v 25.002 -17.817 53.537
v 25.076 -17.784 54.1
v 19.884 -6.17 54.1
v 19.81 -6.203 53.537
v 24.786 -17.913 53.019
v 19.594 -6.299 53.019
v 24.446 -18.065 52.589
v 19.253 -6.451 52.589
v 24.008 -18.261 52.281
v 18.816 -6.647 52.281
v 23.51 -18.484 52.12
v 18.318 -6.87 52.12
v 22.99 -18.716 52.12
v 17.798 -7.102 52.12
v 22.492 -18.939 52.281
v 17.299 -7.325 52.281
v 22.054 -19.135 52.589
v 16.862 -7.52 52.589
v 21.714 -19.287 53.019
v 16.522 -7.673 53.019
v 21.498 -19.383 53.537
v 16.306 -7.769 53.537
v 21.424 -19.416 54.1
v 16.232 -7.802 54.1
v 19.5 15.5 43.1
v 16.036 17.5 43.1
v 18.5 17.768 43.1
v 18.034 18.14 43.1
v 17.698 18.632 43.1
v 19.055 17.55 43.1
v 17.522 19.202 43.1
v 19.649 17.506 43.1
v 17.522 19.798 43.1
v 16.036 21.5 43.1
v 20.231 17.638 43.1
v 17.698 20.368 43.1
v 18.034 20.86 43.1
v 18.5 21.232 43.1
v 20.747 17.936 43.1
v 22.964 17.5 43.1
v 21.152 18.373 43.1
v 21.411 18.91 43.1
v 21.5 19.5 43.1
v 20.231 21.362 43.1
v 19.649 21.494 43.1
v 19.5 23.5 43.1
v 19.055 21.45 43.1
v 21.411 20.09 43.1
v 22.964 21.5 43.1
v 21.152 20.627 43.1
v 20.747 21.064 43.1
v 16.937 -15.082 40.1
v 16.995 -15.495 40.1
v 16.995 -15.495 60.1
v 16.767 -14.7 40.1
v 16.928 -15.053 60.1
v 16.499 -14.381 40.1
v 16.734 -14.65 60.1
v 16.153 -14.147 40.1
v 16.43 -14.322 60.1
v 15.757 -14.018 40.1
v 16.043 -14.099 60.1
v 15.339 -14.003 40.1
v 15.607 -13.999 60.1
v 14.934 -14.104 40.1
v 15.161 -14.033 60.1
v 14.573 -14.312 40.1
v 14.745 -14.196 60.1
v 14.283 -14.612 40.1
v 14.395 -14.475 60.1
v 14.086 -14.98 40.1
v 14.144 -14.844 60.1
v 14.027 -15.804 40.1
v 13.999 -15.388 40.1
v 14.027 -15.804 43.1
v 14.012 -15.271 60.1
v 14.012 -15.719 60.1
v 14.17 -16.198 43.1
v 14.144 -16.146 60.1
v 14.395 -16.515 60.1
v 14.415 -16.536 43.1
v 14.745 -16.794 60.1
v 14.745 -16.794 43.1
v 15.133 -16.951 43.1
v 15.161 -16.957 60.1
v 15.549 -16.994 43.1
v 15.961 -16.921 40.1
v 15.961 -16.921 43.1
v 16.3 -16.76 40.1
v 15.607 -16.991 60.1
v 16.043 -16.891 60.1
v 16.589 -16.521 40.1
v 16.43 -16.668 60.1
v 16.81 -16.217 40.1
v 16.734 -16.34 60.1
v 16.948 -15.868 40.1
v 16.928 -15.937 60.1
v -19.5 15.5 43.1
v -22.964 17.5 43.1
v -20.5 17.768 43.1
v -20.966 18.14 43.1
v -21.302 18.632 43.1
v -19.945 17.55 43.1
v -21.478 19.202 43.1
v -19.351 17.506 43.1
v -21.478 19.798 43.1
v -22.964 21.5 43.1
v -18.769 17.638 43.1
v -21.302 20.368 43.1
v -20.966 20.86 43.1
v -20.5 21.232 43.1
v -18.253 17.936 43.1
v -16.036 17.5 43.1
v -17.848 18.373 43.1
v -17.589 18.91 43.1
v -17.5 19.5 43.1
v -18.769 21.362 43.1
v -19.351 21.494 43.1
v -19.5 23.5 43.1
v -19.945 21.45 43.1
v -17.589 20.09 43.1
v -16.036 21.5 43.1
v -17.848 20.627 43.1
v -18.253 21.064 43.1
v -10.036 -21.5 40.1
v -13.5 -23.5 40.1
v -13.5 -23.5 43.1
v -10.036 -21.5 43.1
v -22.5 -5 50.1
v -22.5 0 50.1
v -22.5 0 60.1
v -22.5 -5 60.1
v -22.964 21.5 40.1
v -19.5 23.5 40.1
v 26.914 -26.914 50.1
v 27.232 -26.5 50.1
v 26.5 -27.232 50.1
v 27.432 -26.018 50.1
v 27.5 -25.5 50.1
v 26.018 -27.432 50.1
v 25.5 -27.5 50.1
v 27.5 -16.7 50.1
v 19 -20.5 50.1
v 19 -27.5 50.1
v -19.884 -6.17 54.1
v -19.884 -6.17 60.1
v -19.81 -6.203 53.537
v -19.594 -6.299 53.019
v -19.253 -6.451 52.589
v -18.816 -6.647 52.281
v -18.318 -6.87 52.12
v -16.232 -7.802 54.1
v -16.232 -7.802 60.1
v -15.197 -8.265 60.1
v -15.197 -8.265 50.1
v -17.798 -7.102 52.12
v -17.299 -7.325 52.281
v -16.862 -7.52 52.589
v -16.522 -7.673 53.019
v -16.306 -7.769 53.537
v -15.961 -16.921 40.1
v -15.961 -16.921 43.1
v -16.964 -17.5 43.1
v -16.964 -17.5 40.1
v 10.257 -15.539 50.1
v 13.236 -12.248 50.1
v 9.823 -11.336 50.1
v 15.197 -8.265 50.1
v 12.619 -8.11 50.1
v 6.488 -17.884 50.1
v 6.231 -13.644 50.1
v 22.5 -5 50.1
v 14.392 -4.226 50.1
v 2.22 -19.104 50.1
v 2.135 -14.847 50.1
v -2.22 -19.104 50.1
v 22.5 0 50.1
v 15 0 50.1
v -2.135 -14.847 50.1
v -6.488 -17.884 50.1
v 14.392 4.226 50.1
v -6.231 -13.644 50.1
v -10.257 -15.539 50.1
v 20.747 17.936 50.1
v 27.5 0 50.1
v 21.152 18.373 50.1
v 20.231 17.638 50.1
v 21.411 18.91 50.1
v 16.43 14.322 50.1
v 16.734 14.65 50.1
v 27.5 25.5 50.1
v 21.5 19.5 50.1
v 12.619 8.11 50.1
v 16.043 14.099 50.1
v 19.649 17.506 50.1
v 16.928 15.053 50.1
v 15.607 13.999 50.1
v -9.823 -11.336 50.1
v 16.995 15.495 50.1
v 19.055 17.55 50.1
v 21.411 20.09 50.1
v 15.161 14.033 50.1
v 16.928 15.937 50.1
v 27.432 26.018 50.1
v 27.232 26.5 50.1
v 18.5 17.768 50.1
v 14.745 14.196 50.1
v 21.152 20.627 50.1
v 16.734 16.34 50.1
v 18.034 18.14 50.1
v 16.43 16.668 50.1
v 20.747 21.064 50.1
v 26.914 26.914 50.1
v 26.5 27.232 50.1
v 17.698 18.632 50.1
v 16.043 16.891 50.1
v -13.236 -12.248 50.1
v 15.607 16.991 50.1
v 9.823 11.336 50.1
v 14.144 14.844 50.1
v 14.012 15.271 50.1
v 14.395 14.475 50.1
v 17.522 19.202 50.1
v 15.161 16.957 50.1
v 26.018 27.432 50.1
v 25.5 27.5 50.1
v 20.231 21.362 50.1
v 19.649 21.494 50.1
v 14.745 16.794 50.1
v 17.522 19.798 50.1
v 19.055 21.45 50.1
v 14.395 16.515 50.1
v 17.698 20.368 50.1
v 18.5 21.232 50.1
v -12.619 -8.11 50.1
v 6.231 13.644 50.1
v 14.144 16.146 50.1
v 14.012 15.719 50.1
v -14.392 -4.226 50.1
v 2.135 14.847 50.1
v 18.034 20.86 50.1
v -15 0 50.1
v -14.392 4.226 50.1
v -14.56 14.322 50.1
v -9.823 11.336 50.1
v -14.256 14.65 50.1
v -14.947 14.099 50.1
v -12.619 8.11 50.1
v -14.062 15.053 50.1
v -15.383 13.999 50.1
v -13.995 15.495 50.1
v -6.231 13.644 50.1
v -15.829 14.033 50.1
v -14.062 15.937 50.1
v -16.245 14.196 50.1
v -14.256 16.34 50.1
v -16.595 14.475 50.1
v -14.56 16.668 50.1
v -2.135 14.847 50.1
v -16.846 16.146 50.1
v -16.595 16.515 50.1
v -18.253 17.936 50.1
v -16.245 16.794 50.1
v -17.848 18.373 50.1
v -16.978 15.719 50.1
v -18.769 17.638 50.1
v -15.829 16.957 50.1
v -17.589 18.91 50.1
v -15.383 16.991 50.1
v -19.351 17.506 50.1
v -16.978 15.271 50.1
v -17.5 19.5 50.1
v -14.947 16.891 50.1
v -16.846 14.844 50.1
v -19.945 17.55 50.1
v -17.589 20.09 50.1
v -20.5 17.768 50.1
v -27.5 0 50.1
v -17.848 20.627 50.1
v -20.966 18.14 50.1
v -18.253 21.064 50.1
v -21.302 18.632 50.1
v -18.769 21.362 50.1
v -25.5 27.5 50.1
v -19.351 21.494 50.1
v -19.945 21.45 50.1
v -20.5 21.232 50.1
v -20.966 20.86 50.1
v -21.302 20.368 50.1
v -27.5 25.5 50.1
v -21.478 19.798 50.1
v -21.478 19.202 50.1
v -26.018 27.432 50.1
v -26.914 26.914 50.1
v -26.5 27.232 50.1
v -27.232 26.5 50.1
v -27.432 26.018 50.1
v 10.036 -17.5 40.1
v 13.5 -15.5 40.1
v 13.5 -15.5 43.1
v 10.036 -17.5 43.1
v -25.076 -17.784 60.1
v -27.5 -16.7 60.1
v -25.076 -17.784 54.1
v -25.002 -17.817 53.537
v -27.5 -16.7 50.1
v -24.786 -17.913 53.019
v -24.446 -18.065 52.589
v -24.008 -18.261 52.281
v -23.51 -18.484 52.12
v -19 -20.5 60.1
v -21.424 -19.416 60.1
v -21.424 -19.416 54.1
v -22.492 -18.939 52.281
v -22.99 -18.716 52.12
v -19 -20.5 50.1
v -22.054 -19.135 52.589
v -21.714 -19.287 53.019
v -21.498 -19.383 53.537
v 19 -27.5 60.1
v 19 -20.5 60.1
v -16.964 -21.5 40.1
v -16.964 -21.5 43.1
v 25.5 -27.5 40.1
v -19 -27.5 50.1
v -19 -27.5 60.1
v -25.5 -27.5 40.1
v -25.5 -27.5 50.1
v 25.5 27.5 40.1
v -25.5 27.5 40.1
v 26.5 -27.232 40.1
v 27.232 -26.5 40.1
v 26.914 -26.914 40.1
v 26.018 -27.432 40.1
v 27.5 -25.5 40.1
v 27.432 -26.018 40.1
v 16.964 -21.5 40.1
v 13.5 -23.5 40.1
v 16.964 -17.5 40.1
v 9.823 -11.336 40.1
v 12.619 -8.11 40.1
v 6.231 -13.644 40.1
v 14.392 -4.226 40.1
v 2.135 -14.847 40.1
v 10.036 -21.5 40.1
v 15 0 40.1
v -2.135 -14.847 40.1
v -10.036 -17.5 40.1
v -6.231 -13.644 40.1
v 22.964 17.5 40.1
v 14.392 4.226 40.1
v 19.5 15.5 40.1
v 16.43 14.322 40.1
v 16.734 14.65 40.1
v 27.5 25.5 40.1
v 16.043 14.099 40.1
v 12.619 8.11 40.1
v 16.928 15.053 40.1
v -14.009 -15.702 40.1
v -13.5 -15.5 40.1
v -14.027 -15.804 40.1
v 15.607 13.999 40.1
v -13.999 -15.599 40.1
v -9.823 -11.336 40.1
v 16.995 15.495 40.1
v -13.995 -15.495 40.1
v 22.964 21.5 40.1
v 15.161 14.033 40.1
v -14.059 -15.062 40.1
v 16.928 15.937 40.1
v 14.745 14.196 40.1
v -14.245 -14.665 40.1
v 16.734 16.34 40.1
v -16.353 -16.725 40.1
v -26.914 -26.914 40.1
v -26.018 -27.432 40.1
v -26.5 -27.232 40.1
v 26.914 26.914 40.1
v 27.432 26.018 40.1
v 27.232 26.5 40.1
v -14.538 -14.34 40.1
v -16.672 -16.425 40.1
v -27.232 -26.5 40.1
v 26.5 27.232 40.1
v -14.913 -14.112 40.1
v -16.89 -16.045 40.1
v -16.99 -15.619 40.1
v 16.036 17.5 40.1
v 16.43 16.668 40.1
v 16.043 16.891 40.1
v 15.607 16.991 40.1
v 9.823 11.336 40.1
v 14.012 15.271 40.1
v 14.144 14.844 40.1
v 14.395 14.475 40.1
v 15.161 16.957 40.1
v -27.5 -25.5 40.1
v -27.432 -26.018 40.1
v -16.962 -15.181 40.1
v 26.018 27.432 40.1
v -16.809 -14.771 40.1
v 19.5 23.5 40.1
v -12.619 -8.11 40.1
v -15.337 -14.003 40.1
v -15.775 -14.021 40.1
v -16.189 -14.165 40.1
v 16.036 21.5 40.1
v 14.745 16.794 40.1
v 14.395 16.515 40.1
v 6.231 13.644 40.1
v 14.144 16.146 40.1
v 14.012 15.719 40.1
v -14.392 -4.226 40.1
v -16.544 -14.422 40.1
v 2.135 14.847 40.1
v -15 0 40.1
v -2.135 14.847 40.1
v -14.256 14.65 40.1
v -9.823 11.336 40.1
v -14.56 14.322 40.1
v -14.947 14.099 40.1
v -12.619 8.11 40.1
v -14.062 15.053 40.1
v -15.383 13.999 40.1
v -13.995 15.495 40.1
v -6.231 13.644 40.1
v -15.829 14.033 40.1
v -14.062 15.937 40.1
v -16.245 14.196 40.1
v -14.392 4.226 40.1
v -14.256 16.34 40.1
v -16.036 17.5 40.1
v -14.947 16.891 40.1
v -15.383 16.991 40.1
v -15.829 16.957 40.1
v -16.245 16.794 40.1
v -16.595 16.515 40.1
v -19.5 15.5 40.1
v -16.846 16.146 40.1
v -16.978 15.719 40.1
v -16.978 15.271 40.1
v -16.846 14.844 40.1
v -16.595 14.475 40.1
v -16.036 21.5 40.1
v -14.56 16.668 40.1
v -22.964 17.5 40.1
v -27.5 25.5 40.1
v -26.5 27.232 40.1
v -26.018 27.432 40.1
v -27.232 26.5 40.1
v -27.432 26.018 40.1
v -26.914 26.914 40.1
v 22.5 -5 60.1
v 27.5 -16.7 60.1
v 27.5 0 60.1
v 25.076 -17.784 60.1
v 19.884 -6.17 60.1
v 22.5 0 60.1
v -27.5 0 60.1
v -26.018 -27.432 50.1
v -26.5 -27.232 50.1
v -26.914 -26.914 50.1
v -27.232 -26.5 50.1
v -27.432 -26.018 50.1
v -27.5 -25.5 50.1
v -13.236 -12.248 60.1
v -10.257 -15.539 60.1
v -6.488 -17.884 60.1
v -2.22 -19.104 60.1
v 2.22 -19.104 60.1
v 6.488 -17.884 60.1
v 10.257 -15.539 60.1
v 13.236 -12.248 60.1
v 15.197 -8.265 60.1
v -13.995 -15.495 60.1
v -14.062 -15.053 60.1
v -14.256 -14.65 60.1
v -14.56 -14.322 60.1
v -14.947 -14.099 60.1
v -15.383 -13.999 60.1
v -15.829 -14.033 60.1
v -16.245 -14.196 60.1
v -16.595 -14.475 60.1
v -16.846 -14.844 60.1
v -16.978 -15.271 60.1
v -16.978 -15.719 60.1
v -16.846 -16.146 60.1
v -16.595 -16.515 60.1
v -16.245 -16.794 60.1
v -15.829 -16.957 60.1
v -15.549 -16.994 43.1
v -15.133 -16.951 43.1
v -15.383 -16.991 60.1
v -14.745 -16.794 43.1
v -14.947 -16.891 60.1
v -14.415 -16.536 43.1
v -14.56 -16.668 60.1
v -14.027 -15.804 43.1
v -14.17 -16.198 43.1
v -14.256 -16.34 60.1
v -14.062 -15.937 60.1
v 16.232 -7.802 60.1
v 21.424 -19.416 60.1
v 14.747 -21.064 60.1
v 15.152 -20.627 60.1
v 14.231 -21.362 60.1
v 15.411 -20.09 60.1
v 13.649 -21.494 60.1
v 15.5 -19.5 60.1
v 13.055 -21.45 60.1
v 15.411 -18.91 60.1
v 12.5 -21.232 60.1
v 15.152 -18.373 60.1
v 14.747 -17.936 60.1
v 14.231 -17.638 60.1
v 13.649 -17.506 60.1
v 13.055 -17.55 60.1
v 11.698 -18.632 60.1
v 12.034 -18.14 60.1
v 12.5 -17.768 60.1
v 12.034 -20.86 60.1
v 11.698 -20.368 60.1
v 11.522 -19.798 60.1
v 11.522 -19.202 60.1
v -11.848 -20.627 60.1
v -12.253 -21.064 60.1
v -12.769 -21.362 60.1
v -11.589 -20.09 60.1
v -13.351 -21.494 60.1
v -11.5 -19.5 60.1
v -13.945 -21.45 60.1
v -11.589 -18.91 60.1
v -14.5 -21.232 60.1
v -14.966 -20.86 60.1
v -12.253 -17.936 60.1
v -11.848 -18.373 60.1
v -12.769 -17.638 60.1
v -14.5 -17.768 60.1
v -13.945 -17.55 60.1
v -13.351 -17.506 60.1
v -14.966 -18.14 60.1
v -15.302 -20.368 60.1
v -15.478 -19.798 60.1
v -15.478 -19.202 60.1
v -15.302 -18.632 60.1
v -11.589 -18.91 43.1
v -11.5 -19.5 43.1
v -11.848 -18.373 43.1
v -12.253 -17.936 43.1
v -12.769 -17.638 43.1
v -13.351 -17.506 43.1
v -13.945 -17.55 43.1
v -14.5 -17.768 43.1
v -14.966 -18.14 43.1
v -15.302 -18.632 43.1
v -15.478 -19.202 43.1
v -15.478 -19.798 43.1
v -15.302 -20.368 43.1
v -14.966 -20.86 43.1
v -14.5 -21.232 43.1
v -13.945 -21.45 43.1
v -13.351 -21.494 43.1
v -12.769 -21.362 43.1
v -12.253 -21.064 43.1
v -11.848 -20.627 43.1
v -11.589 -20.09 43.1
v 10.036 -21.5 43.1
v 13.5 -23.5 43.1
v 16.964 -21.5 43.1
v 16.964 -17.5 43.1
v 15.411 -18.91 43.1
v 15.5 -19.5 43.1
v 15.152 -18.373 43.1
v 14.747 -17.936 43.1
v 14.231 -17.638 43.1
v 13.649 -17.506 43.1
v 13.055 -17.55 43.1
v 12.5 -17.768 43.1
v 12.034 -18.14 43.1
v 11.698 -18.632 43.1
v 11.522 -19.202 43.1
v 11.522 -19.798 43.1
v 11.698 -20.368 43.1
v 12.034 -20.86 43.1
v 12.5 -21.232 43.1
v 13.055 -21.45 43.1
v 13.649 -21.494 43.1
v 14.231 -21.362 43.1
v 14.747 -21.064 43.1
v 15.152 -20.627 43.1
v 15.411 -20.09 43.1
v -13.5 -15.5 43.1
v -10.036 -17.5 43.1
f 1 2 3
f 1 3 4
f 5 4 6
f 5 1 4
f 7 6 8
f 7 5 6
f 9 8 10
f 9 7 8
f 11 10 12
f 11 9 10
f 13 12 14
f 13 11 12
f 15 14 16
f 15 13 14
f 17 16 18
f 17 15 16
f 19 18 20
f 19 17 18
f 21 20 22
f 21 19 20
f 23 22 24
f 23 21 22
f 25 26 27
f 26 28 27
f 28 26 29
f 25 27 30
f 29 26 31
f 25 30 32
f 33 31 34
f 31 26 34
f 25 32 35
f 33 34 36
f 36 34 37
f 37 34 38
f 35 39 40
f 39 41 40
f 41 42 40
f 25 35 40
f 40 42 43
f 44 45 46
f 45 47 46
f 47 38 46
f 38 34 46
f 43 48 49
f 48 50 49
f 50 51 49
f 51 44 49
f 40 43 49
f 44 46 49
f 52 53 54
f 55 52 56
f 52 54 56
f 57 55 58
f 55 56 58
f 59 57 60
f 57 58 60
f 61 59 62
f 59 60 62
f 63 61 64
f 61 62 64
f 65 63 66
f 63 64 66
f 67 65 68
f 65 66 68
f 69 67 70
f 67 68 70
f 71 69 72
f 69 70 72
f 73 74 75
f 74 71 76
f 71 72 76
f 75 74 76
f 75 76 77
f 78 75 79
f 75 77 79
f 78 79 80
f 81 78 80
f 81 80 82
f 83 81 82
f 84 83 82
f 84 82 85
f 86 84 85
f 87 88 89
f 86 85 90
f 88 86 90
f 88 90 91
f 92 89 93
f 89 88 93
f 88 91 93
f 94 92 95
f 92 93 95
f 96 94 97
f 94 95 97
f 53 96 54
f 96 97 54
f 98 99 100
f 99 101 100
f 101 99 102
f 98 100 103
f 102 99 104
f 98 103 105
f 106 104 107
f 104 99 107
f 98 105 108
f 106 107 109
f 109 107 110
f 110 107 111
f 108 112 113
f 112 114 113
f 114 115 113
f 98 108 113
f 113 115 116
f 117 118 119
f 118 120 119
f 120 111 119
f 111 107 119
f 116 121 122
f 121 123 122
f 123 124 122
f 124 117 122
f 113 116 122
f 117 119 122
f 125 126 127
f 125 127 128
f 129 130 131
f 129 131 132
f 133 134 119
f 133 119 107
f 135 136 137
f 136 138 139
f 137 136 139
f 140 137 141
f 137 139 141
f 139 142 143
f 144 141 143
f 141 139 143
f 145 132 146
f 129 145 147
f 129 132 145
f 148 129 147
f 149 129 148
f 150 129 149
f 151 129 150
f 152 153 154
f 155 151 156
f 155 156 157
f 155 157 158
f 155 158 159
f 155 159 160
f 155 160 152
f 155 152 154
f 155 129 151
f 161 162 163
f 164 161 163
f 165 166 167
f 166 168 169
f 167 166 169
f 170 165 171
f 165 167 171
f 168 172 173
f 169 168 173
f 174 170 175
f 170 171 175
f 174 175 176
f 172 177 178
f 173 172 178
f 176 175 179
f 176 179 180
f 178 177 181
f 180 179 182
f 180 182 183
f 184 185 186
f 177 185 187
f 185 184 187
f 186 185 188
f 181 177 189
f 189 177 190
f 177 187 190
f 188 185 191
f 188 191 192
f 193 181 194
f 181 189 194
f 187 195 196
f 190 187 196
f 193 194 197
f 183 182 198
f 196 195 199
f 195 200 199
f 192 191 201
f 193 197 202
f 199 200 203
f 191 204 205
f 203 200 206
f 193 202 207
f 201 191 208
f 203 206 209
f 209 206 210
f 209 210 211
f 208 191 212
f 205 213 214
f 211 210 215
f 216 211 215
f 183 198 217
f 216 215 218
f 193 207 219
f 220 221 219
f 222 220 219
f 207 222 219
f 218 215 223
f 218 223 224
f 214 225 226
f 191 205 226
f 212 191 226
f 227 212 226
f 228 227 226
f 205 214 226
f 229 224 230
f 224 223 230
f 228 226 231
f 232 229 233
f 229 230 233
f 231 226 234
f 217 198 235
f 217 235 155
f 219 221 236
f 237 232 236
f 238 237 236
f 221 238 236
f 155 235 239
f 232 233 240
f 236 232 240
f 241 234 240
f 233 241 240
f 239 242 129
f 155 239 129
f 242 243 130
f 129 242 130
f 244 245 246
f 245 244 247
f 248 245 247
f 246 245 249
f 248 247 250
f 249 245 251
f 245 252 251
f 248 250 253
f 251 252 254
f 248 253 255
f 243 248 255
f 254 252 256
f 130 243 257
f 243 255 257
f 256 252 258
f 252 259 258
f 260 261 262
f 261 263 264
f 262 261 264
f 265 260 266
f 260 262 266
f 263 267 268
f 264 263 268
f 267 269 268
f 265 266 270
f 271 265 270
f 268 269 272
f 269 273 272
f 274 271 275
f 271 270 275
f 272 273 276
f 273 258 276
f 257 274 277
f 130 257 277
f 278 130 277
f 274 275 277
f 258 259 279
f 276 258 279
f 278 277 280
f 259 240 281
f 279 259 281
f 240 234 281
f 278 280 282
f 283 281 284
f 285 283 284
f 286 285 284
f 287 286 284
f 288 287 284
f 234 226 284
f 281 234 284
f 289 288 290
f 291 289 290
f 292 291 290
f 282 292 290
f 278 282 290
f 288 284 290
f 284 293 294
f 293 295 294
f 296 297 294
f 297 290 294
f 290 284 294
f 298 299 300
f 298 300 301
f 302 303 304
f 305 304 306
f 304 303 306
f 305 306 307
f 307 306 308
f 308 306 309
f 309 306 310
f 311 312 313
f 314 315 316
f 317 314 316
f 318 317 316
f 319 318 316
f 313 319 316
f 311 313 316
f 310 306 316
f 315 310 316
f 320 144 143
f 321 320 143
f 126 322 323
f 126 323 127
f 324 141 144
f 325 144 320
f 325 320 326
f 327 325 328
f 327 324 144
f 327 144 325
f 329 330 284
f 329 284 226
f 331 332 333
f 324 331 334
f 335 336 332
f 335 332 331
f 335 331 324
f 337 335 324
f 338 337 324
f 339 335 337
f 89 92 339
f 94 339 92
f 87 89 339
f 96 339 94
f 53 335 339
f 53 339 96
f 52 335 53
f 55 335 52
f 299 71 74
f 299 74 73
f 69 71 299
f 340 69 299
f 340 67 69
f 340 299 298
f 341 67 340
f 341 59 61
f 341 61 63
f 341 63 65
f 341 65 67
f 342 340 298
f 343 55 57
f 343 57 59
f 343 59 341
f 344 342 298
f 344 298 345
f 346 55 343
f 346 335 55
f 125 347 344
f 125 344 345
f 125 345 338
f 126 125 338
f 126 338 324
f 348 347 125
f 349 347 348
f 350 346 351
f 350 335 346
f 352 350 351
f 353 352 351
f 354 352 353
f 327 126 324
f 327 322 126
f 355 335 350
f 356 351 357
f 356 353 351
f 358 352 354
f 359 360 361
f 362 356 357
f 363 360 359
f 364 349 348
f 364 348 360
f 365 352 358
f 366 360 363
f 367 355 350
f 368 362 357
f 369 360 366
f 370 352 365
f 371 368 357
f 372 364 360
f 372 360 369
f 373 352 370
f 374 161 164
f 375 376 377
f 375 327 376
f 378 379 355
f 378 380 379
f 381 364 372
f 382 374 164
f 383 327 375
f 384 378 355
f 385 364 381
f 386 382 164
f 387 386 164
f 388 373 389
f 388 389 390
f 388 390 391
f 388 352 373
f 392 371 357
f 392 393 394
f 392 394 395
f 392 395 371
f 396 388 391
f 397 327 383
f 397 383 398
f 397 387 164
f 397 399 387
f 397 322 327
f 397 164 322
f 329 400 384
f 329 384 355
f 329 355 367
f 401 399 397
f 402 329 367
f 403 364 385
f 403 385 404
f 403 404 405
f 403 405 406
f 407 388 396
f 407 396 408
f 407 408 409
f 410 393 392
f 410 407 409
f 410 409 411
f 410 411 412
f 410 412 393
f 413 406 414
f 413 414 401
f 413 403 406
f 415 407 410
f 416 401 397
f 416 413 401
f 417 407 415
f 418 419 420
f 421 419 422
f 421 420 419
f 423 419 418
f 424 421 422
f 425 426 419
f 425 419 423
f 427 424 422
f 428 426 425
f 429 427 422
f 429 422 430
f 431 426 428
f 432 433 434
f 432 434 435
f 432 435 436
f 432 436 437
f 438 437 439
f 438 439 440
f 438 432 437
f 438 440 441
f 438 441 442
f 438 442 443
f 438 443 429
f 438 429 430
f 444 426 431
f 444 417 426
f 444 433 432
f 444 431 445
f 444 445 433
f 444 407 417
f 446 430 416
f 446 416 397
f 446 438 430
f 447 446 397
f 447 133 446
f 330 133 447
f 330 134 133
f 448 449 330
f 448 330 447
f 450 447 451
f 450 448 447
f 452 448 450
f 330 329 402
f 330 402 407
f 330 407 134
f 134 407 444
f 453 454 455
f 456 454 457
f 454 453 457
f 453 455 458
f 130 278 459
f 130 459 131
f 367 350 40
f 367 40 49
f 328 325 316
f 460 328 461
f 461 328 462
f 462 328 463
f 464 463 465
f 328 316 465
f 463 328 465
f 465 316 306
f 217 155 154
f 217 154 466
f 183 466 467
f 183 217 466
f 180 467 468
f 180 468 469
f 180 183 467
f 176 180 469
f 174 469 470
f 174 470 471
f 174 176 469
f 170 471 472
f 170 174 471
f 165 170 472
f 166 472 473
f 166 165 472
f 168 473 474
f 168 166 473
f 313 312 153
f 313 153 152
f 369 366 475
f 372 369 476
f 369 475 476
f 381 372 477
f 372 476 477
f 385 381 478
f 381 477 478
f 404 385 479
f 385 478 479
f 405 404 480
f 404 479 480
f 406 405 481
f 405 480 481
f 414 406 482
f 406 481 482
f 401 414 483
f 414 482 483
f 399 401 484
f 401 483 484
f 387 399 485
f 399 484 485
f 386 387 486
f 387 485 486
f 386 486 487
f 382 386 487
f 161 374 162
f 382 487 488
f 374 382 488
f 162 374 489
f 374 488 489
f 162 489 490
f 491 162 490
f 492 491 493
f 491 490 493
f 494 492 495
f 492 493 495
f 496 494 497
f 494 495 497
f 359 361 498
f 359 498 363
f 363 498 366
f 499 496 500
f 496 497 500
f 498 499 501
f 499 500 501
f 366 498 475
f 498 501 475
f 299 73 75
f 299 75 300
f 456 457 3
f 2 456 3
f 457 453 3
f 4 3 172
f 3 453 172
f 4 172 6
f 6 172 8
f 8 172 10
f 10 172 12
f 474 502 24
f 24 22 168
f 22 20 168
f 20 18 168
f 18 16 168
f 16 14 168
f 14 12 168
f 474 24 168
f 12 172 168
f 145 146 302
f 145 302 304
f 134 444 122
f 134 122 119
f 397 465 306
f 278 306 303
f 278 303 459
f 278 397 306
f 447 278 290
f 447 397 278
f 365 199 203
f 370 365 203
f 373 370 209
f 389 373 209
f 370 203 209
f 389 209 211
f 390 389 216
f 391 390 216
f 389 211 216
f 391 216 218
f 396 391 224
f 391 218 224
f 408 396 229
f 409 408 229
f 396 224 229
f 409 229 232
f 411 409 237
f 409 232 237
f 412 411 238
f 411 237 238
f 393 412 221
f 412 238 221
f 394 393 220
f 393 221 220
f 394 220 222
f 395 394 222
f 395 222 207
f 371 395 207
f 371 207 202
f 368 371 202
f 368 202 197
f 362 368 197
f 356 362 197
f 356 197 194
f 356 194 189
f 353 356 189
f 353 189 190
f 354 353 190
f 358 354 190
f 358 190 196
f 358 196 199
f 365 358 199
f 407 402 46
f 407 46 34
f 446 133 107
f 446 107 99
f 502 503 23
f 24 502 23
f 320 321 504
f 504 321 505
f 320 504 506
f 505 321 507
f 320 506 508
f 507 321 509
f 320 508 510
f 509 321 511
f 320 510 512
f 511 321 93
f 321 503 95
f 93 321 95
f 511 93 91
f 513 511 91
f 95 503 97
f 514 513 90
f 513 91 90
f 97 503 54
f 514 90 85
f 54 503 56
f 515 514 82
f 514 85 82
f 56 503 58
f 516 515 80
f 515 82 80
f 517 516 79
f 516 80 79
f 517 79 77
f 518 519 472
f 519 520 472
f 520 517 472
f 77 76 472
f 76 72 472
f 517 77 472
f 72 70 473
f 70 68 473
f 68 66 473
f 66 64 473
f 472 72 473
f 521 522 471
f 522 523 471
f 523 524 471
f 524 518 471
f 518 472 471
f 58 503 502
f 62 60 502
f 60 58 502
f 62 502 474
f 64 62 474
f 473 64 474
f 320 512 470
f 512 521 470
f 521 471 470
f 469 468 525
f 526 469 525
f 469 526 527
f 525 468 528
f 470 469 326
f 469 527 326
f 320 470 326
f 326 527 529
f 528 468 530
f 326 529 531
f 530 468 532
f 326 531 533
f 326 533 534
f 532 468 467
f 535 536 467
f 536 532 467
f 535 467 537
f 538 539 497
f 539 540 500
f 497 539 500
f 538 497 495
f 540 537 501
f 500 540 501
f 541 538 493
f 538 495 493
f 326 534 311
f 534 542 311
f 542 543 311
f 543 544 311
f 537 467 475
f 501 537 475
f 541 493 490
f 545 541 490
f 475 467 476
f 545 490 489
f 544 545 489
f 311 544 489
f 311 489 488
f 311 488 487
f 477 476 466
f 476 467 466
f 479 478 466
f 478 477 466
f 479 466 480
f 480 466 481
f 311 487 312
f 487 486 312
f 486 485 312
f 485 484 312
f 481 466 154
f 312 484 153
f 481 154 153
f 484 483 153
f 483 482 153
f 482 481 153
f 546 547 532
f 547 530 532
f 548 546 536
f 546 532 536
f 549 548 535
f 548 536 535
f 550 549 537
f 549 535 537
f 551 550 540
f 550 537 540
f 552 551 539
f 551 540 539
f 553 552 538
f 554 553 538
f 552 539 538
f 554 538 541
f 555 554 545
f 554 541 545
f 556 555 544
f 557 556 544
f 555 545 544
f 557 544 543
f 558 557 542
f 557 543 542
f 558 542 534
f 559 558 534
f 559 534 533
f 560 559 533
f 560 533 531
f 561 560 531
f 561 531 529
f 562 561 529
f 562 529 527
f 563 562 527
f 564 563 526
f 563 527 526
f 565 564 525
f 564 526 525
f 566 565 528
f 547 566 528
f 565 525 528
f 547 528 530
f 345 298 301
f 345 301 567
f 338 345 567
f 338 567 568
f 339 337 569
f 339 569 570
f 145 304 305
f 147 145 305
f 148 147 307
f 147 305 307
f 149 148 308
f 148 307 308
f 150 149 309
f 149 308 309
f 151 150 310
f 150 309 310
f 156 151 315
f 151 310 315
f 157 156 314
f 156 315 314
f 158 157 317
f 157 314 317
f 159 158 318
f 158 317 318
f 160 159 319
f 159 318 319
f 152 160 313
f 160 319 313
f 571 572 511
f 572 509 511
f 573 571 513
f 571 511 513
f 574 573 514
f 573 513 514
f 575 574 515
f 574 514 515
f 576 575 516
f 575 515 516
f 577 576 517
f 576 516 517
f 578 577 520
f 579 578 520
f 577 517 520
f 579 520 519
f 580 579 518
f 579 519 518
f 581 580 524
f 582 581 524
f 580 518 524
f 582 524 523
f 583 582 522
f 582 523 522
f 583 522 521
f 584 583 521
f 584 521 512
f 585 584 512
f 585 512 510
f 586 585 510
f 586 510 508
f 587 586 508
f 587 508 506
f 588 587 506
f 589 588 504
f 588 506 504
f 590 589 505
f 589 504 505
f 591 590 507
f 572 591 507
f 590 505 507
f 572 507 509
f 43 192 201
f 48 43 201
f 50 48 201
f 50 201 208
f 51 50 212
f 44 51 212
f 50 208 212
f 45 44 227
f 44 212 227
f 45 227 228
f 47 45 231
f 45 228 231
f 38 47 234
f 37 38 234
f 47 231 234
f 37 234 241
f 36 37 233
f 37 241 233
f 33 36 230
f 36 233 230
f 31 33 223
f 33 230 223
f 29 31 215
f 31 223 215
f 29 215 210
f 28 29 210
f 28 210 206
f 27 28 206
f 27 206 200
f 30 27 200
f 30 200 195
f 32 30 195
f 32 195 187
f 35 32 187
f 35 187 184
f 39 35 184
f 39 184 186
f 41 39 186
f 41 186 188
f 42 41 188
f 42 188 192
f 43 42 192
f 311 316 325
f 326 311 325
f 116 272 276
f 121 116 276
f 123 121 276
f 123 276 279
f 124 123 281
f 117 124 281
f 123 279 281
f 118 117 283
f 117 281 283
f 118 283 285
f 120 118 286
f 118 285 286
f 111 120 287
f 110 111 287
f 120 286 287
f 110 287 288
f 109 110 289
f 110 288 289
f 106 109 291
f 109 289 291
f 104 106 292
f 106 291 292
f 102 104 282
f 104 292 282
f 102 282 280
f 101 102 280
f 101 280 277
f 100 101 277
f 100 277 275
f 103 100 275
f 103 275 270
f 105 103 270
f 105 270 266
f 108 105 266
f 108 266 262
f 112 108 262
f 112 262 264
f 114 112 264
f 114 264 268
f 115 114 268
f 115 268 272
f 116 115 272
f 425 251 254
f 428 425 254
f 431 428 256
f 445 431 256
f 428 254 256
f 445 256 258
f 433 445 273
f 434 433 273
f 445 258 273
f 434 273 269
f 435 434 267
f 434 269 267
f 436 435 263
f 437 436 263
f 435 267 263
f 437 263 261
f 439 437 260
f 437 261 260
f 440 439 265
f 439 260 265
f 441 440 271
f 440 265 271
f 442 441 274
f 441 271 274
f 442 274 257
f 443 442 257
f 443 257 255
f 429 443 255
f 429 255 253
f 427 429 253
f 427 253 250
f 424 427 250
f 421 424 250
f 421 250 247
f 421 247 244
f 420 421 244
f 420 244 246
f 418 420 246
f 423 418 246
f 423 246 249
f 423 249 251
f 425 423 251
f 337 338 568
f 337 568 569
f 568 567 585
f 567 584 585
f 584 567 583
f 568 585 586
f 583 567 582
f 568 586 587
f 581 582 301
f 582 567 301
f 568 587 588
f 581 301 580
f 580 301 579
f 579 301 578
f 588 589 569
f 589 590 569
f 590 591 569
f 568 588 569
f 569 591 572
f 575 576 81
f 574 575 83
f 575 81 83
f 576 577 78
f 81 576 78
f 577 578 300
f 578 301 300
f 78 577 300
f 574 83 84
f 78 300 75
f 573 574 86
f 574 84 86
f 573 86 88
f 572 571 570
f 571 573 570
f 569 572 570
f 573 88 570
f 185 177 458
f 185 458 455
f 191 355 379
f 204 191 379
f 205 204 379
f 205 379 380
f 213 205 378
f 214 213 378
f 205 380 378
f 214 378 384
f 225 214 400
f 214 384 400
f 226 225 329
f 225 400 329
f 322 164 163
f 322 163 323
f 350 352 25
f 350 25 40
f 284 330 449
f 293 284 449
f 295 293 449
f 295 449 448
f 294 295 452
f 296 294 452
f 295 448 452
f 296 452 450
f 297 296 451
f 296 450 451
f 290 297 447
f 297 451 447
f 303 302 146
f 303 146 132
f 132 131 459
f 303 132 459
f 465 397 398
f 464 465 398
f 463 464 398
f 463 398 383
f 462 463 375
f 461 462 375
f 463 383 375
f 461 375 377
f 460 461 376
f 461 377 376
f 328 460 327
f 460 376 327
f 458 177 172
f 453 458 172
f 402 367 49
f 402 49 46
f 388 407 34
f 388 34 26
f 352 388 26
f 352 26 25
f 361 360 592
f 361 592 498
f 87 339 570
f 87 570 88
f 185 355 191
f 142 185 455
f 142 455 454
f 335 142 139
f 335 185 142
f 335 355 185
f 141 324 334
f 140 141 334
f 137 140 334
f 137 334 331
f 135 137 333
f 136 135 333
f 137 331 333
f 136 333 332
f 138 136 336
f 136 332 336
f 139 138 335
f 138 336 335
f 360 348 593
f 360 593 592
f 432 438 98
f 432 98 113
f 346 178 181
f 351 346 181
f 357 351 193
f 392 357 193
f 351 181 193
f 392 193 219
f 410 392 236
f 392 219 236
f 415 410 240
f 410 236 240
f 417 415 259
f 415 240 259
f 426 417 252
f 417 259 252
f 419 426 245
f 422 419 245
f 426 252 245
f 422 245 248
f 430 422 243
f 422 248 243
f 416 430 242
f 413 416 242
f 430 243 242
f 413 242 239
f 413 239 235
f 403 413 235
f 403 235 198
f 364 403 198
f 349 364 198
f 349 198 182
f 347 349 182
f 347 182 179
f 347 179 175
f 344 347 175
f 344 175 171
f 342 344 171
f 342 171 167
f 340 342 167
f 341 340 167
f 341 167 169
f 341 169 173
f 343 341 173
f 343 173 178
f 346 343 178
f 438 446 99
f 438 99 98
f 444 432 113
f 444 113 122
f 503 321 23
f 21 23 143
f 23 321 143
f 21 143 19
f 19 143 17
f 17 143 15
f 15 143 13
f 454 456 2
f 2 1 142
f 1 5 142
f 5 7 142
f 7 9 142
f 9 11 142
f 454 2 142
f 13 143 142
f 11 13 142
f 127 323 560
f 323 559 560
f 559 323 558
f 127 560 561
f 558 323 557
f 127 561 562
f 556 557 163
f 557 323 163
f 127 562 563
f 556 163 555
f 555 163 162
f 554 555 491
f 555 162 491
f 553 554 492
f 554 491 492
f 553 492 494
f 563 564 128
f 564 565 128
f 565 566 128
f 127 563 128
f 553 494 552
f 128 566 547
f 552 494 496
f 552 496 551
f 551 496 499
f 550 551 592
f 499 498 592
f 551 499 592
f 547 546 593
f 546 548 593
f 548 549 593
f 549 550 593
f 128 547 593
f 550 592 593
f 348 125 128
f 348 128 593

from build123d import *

# Parameters (mm, degrees)
PAD009_DEPTH         = 10
PAD010_DEPTH         = 10
POCKET011_DEPTH      = 223.4231860076
SKETCH024_R          = 15
SKETCH024_R_2        = 1.5
SKETCH024_R_3        = 2
POCKET012_DEPTH      = 10.001
POCKET012_DEPTH_BACK = 10.001
POCKET013_DEPTH      = 3


with BuildPart() as part:
    # Sketch021 → Pad009 (new body)
    with BuildSketch(Plane.XY.offset(40.1)):
        with BuildLine():
            Line((-25.5, 27.5), (25.5, 27.5))
            ThreePointArc((27.5, 25.5), (26.9142135624, 26.9142135624), (25.5, 27.5))
            Line((27.5, 25.5), (27.5, -25.5))
            ThreePointArc((25.5, -27.5), (26.9142135624, -26.9142135624), (27.5, -25.5))
            Line((25.5, -27.5), (-25.5, -27.5))
            ThreePointArc((-27.5, -25.5), (-26.9142135624, -26.9142135624), (-25.5, -27.5))
            Line((-27.5, -25.5), (-27.5, 25.5))
            ThreePointArc((-25.5, 27.5), (-26.9142135624, 26.9142135624), (-27.5, 25.5))
        make_face()
    extrude(amount=PAD009_DEPTH)

    # Sketch022 → Pad010 (join)
    with BuildSketch(Plane.XY.offset(50.1)):
        with BuildLine():
            Line((-27.5, 0), (-22.5, 0))
            Line((-22.5, 0), (-22.5, -5))
            Line((-22.5, -5), (-15.1966113671, -8.26504433))
            ThreePointArc((-15.1966113671, -8.26504433), (0, -19.2587479987), (15.1966113671, -8.26504433))
            Line((22.5, -5), (15.1966113671, -8.26504433))
            Line((22.5, 0), (22.5, -5))
            Line((22.5, 0), (27.5, 0))
            Line((27.5, -16.7), (27.5, 0))
            Line((19, -20.5), (27.5, -16.7))
            Line((19, -27.5), (19, -20.5))
            Line((-19, -27.5), (19, -27.5))
            Line((-19, -20.5), (-19, -27.5))
            Line((-27.5, -16.7), (-19, -20.5))
            Line((-27.5, 0), (-27.5, -16.7))
        make_face()
    extrude(amount=PAD010_DEPTH)

    # Sketch023 (on Face25 of Pad010) → Pocket011 (cut, through all)
    with BuildSketch(Plane(origin=(-10.8029761218, -24.1645518514, 0), x_dir=(0.9129235791, -0.4081305413, 0), z_dir=(-0.4081305413, -0.9129235791, 0))):
        with BuildLine():
            Line((-15.6342451471, 60.1), (-11.6342451471, 60.1))
            Line((-11.6342451471, 60.1), (-11.6342451471, 54.1))
            ThreePointArc((-15.6342451471, 54.1), (-13.6342451471, 52.1), (-11.6342451471, 54.1))
            Line((-15.6342451471, 60.1), (-15.6342451471, 54.1))
        make_face()
    pocket011 = extrude(amount=-POCKET011_DEPTH, mode=Mode.SUBTRACT)

    # Mirrored: Pocket011 across YZ
    add(pocket011.mirror(Plane.YZ), mode=Mode.SUBTRACT)

    # Sketch024 → Pocket012 (cut, two sides)
    with BuildSketch(Plane.XY.offset(50.1)) as pocket012_sk:
        Circle(SKETCH024_R)
        with Locations((15.495, 15.495)):
            Circle(SKETCH024_R_2)
        with Locations((15.495, -15.495)):
            Circle(SKETCH024_R_2)
        with Locations((-15.495, -15.495)):
            Circle(SKETCH024_R_2)
        with Locations((-15.495, 15.495)):
            Circle(SKETCH024_R_2)
        with Locations((-19.5, 19.5)):
            Circle(SKETCH024_R_3)
        with Locations((-13.5, -19.5)):
            Circle(SKETCH024_R_3)
        with Locations((13.5, -19.5)):
            Circle(SKETCH024_R_3)
        with Locations((19.5, 19.5)):
            Circle(SKETCH024_R_3)
    extrude(amount=-POCKET012_DEPTH, mode=Mode.SUBTRACT)
    extrude(pocket012_sk.sketch, amount=POCKET012_DEPTH_BACK, mode=Mode.SUBTRACT)

    # Sketch026 → Pocket013 (cut)
    with BuildSketch(Plane.XY.offset(40.1)):
        Polygon((22.9641016151, 17.5), (22.9641016151, 21.5), (19.5, 23.5), (16.0358983849, 21.5), (16.0358983849, 17.5), (19.5, 15.5), align=None)
        Polygon((16.9641016151, -21.5), (16.9641016151, -17.5), (13.5, -15.5), (10.0358983849, -17.5), (10.0358983849, -21.5), (13.5, -23.5), align=None)
        Polygon((-10.0358983849, -21.5), (-10.0358983849, -17.5), (-13.5, -15.5), (-16.9641016151, -17.5), (-16.9641016151, -21.5), (-13.5, -23.5), align=None)
        Polygon((-16.0358983849, 17.5), (-16.0358983849, 21.5), (-19.5, 23.5), (-22.9641016151, 21.5), (-22.9641016151, 17.5), (-19.5, 15.5), align=None)
    extrude(amount=POCKET013_DEPTH, mode=Mode.SUBTRACT)


solid = part.part
